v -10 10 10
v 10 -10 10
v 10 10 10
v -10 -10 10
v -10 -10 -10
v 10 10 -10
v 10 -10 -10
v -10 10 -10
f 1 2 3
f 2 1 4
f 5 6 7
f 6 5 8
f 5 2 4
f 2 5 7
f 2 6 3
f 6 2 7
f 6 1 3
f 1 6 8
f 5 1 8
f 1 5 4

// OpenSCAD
// Error occurred during generation
// Error: 'str' object has no attribute 'items'
// Original prompt: Generate a parametric bolt using BOSL2

// Fallback basic shape
$fn = 100;
cube(20, center=true);
